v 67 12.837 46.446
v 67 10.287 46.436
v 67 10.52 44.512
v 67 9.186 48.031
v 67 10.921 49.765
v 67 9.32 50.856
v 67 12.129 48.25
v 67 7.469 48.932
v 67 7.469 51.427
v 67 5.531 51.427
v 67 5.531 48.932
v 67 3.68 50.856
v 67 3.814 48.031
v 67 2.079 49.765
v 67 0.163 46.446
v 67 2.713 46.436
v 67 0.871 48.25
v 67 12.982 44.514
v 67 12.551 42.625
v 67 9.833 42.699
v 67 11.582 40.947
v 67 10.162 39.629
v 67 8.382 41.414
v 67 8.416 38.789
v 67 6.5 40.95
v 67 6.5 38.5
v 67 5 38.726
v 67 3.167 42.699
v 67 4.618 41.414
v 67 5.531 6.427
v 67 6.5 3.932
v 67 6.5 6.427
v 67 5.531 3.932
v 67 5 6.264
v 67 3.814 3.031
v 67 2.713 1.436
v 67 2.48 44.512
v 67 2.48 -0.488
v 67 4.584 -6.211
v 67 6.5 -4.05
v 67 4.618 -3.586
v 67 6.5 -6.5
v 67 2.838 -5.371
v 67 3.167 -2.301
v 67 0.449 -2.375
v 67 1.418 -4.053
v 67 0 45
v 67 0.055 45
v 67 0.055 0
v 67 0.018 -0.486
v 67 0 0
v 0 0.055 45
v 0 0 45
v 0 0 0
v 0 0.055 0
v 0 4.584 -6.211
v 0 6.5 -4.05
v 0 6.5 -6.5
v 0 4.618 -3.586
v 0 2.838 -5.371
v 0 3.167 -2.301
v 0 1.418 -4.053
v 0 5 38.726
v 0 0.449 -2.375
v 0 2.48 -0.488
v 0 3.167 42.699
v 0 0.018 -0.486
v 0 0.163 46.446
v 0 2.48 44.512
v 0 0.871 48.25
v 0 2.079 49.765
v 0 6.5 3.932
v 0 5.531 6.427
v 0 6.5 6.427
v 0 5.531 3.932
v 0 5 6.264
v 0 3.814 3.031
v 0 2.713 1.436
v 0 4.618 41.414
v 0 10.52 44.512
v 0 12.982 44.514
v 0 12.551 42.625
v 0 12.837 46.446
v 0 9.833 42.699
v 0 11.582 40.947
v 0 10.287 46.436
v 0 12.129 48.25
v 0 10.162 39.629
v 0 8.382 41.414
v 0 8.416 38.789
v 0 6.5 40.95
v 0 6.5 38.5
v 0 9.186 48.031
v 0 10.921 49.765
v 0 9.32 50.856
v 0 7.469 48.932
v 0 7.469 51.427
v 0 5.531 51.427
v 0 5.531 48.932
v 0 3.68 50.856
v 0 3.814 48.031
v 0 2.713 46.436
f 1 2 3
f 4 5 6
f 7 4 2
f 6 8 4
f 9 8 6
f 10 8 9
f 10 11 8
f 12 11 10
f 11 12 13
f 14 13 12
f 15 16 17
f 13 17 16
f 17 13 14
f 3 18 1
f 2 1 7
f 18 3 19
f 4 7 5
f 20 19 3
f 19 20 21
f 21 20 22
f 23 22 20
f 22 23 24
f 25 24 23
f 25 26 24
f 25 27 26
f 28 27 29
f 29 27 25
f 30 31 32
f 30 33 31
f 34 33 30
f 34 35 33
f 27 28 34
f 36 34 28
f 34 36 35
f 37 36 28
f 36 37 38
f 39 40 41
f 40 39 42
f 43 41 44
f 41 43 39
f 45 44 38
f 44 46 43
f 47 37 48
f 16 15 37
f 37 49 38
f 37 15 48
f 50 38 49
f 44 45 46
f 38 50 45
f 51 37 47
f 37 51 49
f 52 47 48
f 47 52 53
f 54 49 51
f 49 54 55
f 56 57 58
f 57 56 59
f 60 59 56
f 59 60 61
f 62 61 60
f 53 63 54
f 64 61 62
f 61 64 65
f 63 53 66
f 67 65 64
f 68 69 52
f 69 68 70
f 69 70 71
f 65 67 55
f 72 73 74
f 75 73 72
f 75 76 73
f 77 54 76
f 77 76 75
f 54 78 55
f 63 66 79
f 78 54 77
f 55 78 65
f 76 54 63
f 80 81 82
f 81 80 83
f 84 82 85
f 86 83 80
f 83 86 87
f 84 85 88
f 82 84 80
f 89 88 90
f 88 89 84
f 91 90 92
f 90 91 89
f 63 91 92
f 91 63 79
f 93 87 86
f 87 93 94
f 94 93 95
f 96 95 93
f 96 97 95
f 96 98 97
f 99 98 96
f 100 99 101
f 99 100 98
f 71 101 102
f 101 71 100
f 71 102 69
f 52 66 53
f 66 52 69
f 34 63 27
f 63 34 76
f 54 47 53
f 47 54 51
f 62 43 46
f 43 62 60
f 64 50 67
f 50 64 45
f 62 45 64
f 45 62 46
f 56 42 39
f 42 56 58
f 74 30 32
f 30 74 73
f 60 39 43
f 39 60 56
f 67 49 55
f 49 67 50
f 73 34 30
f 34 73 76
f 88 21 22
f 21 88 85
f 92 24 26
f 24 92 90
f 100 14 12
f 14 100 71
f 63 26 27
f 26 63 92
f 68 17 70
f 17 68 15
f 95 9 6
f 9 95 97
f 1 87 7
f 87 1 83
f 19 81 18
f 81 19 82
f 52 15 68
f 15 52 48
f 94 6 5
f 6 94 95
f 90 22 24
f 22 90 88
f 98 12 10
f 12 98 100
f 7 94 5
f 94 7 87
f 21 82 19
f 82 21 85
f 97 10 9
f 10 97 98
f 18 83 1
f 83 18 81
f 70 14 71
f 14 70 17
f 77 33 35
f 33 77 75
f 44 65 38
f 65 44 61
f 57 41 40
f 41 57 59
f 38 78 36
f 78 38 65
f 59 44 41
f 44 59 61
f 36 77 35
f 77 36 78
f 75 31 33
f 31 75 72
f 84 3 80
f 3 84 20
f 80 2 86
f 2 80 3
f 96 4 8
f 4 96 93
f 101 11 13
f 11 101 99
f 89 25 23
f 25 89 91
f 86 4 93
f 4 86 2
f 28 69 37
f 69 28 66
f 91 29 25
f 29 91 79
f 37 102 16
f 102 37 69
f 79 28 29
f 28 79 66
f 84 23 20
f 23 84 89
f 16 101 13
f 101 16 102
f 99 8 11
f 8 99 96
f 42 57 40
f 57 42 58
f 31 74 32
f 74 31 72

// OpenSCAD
// file: DialGauge.scad
/*
Dial Gauge Model

Parameters:
    diameter - The diameter of the dial body
    width - The width of the dial body
    mount_diameter - The diameter of the mount rod
    mount_lenght - The length of the mount rod
    mount_center_distance - The distance from the back of the dial body to the center of the mount rod
*/
module Dial_Gauge(diameter, width, mount_diameter, mount_lenght, mount_center_distance)
{
 
 translate([0, mount_center_distance, diameter/2 + mount_lenght]) rotate([90,0,0]) cylinder(h=width, d=diameter);
 cylinder(h=mount_lenght+1, d=mount_diameter);
 
 
    
}

// Test model
diameter = 57;
width = 25;
mount_diameter = 8;
mount_lenght = 20;
mount_center_distance = 8;
Dial_Gauge(diameter, width, mount_diameter, mount_lenght, mount_center_distance);
// main file
/*
Dial Gauge Mount for Prusa I3

Parameters:
    tolerance = This value is added to the negatives (using a diameter d for a negative will create a d+tolerance hole
    x_rod_diameter - the diameter of the x rods
    x_rod_distance - the distance between the 2 x rods 
    wall_thickness - how thick will the walls be
    
*/

tolerance = 0.1;
x_rod_diameter = 8;
x_rod_distance = 45;
wall_thickness = 5;


// Dial Gauge
diameter = 57;
width = 25;
mount_diameter = 8;
mount_lenght = 20;
mount_center_distance = 8;

use <DialGauge.scad>;
module dial_support()
{
    difference()
    {
        translate([-(diameter + 2*wall_thickness)/2, mount_center_distance-width, mount_lenght-wall_thickness]) difference()
        {
            intersection()
            {
                cube([diameter + 2*wall_thickness, width + wall_thickness, diameter + 2*wall_thickness],false);
                translate([(diameter + 2*wall_thickness)/2, 0, (diameter + 2*wall_thickness)/2]) {
                    rotate([-90,0,0]) cylinder(h=width + wall_thickness, d=diameter + 2*wall_thickness);
                }
            }
            translate([0, -1, (diameter + 2*wall_thickness)/2]) cube([diameter + 2*wall_thickness, width+1, (diameter + 2*wall_thickness)/2], false);
        }
        Dial_Gauge(diameter+tolerance, width+tolerance, mount_diameter+tolerance, mount_lenght, mount_center_distance);
    }
}

module printer_support()
{
    difference()
    {
        union()
        {
            cube([diameter + 2*wall_thickness, wall_thickness, x_rod_distance]);
            translate([0,(wall_thickness+x_rod_diameter)/2, 0]) rotate([0,90,0]) cylinder(h=diameter + 2*wall_thickness, d=wall_thickness+x_rod_diameter);
            translate([0,(wall_thickness+x_rod_diameter)/2, x_rod_distance]) rotate([0,90,0]) cylinder(h=diameter + 2*wall_thickness, d=wall_thickness+x_rod_diameter);
        }
        translate([-1,(wall_thickness+x_rod_diameter)/2,0]) rotate([0,90,0])cylinder(h=diameter+2 + 2*wall_thickness, d=x_rod_diameter+tolerance);
        translate([-1,(wall_thickness+x_rod_diameter)/2,x_rod_distance]) rotate([0,90,0])cylinder(h=diameter+2 + 2*wall_thickness, d=x_rod_diameter+tolerance);
        translate([-1,(wall_thickness+x_rod_diameter)/2,-(wall_thickness+x_rod_diameter)/2]) cube([diameter + 2*wall_thickness+2,(wall_thickness+x_rod_diameter)/2+tolerance,wall_thickness+x_rod_diameter+tolerance]);
    }
    
}

union()
{
    *dial_support();
    printer_support();
}
